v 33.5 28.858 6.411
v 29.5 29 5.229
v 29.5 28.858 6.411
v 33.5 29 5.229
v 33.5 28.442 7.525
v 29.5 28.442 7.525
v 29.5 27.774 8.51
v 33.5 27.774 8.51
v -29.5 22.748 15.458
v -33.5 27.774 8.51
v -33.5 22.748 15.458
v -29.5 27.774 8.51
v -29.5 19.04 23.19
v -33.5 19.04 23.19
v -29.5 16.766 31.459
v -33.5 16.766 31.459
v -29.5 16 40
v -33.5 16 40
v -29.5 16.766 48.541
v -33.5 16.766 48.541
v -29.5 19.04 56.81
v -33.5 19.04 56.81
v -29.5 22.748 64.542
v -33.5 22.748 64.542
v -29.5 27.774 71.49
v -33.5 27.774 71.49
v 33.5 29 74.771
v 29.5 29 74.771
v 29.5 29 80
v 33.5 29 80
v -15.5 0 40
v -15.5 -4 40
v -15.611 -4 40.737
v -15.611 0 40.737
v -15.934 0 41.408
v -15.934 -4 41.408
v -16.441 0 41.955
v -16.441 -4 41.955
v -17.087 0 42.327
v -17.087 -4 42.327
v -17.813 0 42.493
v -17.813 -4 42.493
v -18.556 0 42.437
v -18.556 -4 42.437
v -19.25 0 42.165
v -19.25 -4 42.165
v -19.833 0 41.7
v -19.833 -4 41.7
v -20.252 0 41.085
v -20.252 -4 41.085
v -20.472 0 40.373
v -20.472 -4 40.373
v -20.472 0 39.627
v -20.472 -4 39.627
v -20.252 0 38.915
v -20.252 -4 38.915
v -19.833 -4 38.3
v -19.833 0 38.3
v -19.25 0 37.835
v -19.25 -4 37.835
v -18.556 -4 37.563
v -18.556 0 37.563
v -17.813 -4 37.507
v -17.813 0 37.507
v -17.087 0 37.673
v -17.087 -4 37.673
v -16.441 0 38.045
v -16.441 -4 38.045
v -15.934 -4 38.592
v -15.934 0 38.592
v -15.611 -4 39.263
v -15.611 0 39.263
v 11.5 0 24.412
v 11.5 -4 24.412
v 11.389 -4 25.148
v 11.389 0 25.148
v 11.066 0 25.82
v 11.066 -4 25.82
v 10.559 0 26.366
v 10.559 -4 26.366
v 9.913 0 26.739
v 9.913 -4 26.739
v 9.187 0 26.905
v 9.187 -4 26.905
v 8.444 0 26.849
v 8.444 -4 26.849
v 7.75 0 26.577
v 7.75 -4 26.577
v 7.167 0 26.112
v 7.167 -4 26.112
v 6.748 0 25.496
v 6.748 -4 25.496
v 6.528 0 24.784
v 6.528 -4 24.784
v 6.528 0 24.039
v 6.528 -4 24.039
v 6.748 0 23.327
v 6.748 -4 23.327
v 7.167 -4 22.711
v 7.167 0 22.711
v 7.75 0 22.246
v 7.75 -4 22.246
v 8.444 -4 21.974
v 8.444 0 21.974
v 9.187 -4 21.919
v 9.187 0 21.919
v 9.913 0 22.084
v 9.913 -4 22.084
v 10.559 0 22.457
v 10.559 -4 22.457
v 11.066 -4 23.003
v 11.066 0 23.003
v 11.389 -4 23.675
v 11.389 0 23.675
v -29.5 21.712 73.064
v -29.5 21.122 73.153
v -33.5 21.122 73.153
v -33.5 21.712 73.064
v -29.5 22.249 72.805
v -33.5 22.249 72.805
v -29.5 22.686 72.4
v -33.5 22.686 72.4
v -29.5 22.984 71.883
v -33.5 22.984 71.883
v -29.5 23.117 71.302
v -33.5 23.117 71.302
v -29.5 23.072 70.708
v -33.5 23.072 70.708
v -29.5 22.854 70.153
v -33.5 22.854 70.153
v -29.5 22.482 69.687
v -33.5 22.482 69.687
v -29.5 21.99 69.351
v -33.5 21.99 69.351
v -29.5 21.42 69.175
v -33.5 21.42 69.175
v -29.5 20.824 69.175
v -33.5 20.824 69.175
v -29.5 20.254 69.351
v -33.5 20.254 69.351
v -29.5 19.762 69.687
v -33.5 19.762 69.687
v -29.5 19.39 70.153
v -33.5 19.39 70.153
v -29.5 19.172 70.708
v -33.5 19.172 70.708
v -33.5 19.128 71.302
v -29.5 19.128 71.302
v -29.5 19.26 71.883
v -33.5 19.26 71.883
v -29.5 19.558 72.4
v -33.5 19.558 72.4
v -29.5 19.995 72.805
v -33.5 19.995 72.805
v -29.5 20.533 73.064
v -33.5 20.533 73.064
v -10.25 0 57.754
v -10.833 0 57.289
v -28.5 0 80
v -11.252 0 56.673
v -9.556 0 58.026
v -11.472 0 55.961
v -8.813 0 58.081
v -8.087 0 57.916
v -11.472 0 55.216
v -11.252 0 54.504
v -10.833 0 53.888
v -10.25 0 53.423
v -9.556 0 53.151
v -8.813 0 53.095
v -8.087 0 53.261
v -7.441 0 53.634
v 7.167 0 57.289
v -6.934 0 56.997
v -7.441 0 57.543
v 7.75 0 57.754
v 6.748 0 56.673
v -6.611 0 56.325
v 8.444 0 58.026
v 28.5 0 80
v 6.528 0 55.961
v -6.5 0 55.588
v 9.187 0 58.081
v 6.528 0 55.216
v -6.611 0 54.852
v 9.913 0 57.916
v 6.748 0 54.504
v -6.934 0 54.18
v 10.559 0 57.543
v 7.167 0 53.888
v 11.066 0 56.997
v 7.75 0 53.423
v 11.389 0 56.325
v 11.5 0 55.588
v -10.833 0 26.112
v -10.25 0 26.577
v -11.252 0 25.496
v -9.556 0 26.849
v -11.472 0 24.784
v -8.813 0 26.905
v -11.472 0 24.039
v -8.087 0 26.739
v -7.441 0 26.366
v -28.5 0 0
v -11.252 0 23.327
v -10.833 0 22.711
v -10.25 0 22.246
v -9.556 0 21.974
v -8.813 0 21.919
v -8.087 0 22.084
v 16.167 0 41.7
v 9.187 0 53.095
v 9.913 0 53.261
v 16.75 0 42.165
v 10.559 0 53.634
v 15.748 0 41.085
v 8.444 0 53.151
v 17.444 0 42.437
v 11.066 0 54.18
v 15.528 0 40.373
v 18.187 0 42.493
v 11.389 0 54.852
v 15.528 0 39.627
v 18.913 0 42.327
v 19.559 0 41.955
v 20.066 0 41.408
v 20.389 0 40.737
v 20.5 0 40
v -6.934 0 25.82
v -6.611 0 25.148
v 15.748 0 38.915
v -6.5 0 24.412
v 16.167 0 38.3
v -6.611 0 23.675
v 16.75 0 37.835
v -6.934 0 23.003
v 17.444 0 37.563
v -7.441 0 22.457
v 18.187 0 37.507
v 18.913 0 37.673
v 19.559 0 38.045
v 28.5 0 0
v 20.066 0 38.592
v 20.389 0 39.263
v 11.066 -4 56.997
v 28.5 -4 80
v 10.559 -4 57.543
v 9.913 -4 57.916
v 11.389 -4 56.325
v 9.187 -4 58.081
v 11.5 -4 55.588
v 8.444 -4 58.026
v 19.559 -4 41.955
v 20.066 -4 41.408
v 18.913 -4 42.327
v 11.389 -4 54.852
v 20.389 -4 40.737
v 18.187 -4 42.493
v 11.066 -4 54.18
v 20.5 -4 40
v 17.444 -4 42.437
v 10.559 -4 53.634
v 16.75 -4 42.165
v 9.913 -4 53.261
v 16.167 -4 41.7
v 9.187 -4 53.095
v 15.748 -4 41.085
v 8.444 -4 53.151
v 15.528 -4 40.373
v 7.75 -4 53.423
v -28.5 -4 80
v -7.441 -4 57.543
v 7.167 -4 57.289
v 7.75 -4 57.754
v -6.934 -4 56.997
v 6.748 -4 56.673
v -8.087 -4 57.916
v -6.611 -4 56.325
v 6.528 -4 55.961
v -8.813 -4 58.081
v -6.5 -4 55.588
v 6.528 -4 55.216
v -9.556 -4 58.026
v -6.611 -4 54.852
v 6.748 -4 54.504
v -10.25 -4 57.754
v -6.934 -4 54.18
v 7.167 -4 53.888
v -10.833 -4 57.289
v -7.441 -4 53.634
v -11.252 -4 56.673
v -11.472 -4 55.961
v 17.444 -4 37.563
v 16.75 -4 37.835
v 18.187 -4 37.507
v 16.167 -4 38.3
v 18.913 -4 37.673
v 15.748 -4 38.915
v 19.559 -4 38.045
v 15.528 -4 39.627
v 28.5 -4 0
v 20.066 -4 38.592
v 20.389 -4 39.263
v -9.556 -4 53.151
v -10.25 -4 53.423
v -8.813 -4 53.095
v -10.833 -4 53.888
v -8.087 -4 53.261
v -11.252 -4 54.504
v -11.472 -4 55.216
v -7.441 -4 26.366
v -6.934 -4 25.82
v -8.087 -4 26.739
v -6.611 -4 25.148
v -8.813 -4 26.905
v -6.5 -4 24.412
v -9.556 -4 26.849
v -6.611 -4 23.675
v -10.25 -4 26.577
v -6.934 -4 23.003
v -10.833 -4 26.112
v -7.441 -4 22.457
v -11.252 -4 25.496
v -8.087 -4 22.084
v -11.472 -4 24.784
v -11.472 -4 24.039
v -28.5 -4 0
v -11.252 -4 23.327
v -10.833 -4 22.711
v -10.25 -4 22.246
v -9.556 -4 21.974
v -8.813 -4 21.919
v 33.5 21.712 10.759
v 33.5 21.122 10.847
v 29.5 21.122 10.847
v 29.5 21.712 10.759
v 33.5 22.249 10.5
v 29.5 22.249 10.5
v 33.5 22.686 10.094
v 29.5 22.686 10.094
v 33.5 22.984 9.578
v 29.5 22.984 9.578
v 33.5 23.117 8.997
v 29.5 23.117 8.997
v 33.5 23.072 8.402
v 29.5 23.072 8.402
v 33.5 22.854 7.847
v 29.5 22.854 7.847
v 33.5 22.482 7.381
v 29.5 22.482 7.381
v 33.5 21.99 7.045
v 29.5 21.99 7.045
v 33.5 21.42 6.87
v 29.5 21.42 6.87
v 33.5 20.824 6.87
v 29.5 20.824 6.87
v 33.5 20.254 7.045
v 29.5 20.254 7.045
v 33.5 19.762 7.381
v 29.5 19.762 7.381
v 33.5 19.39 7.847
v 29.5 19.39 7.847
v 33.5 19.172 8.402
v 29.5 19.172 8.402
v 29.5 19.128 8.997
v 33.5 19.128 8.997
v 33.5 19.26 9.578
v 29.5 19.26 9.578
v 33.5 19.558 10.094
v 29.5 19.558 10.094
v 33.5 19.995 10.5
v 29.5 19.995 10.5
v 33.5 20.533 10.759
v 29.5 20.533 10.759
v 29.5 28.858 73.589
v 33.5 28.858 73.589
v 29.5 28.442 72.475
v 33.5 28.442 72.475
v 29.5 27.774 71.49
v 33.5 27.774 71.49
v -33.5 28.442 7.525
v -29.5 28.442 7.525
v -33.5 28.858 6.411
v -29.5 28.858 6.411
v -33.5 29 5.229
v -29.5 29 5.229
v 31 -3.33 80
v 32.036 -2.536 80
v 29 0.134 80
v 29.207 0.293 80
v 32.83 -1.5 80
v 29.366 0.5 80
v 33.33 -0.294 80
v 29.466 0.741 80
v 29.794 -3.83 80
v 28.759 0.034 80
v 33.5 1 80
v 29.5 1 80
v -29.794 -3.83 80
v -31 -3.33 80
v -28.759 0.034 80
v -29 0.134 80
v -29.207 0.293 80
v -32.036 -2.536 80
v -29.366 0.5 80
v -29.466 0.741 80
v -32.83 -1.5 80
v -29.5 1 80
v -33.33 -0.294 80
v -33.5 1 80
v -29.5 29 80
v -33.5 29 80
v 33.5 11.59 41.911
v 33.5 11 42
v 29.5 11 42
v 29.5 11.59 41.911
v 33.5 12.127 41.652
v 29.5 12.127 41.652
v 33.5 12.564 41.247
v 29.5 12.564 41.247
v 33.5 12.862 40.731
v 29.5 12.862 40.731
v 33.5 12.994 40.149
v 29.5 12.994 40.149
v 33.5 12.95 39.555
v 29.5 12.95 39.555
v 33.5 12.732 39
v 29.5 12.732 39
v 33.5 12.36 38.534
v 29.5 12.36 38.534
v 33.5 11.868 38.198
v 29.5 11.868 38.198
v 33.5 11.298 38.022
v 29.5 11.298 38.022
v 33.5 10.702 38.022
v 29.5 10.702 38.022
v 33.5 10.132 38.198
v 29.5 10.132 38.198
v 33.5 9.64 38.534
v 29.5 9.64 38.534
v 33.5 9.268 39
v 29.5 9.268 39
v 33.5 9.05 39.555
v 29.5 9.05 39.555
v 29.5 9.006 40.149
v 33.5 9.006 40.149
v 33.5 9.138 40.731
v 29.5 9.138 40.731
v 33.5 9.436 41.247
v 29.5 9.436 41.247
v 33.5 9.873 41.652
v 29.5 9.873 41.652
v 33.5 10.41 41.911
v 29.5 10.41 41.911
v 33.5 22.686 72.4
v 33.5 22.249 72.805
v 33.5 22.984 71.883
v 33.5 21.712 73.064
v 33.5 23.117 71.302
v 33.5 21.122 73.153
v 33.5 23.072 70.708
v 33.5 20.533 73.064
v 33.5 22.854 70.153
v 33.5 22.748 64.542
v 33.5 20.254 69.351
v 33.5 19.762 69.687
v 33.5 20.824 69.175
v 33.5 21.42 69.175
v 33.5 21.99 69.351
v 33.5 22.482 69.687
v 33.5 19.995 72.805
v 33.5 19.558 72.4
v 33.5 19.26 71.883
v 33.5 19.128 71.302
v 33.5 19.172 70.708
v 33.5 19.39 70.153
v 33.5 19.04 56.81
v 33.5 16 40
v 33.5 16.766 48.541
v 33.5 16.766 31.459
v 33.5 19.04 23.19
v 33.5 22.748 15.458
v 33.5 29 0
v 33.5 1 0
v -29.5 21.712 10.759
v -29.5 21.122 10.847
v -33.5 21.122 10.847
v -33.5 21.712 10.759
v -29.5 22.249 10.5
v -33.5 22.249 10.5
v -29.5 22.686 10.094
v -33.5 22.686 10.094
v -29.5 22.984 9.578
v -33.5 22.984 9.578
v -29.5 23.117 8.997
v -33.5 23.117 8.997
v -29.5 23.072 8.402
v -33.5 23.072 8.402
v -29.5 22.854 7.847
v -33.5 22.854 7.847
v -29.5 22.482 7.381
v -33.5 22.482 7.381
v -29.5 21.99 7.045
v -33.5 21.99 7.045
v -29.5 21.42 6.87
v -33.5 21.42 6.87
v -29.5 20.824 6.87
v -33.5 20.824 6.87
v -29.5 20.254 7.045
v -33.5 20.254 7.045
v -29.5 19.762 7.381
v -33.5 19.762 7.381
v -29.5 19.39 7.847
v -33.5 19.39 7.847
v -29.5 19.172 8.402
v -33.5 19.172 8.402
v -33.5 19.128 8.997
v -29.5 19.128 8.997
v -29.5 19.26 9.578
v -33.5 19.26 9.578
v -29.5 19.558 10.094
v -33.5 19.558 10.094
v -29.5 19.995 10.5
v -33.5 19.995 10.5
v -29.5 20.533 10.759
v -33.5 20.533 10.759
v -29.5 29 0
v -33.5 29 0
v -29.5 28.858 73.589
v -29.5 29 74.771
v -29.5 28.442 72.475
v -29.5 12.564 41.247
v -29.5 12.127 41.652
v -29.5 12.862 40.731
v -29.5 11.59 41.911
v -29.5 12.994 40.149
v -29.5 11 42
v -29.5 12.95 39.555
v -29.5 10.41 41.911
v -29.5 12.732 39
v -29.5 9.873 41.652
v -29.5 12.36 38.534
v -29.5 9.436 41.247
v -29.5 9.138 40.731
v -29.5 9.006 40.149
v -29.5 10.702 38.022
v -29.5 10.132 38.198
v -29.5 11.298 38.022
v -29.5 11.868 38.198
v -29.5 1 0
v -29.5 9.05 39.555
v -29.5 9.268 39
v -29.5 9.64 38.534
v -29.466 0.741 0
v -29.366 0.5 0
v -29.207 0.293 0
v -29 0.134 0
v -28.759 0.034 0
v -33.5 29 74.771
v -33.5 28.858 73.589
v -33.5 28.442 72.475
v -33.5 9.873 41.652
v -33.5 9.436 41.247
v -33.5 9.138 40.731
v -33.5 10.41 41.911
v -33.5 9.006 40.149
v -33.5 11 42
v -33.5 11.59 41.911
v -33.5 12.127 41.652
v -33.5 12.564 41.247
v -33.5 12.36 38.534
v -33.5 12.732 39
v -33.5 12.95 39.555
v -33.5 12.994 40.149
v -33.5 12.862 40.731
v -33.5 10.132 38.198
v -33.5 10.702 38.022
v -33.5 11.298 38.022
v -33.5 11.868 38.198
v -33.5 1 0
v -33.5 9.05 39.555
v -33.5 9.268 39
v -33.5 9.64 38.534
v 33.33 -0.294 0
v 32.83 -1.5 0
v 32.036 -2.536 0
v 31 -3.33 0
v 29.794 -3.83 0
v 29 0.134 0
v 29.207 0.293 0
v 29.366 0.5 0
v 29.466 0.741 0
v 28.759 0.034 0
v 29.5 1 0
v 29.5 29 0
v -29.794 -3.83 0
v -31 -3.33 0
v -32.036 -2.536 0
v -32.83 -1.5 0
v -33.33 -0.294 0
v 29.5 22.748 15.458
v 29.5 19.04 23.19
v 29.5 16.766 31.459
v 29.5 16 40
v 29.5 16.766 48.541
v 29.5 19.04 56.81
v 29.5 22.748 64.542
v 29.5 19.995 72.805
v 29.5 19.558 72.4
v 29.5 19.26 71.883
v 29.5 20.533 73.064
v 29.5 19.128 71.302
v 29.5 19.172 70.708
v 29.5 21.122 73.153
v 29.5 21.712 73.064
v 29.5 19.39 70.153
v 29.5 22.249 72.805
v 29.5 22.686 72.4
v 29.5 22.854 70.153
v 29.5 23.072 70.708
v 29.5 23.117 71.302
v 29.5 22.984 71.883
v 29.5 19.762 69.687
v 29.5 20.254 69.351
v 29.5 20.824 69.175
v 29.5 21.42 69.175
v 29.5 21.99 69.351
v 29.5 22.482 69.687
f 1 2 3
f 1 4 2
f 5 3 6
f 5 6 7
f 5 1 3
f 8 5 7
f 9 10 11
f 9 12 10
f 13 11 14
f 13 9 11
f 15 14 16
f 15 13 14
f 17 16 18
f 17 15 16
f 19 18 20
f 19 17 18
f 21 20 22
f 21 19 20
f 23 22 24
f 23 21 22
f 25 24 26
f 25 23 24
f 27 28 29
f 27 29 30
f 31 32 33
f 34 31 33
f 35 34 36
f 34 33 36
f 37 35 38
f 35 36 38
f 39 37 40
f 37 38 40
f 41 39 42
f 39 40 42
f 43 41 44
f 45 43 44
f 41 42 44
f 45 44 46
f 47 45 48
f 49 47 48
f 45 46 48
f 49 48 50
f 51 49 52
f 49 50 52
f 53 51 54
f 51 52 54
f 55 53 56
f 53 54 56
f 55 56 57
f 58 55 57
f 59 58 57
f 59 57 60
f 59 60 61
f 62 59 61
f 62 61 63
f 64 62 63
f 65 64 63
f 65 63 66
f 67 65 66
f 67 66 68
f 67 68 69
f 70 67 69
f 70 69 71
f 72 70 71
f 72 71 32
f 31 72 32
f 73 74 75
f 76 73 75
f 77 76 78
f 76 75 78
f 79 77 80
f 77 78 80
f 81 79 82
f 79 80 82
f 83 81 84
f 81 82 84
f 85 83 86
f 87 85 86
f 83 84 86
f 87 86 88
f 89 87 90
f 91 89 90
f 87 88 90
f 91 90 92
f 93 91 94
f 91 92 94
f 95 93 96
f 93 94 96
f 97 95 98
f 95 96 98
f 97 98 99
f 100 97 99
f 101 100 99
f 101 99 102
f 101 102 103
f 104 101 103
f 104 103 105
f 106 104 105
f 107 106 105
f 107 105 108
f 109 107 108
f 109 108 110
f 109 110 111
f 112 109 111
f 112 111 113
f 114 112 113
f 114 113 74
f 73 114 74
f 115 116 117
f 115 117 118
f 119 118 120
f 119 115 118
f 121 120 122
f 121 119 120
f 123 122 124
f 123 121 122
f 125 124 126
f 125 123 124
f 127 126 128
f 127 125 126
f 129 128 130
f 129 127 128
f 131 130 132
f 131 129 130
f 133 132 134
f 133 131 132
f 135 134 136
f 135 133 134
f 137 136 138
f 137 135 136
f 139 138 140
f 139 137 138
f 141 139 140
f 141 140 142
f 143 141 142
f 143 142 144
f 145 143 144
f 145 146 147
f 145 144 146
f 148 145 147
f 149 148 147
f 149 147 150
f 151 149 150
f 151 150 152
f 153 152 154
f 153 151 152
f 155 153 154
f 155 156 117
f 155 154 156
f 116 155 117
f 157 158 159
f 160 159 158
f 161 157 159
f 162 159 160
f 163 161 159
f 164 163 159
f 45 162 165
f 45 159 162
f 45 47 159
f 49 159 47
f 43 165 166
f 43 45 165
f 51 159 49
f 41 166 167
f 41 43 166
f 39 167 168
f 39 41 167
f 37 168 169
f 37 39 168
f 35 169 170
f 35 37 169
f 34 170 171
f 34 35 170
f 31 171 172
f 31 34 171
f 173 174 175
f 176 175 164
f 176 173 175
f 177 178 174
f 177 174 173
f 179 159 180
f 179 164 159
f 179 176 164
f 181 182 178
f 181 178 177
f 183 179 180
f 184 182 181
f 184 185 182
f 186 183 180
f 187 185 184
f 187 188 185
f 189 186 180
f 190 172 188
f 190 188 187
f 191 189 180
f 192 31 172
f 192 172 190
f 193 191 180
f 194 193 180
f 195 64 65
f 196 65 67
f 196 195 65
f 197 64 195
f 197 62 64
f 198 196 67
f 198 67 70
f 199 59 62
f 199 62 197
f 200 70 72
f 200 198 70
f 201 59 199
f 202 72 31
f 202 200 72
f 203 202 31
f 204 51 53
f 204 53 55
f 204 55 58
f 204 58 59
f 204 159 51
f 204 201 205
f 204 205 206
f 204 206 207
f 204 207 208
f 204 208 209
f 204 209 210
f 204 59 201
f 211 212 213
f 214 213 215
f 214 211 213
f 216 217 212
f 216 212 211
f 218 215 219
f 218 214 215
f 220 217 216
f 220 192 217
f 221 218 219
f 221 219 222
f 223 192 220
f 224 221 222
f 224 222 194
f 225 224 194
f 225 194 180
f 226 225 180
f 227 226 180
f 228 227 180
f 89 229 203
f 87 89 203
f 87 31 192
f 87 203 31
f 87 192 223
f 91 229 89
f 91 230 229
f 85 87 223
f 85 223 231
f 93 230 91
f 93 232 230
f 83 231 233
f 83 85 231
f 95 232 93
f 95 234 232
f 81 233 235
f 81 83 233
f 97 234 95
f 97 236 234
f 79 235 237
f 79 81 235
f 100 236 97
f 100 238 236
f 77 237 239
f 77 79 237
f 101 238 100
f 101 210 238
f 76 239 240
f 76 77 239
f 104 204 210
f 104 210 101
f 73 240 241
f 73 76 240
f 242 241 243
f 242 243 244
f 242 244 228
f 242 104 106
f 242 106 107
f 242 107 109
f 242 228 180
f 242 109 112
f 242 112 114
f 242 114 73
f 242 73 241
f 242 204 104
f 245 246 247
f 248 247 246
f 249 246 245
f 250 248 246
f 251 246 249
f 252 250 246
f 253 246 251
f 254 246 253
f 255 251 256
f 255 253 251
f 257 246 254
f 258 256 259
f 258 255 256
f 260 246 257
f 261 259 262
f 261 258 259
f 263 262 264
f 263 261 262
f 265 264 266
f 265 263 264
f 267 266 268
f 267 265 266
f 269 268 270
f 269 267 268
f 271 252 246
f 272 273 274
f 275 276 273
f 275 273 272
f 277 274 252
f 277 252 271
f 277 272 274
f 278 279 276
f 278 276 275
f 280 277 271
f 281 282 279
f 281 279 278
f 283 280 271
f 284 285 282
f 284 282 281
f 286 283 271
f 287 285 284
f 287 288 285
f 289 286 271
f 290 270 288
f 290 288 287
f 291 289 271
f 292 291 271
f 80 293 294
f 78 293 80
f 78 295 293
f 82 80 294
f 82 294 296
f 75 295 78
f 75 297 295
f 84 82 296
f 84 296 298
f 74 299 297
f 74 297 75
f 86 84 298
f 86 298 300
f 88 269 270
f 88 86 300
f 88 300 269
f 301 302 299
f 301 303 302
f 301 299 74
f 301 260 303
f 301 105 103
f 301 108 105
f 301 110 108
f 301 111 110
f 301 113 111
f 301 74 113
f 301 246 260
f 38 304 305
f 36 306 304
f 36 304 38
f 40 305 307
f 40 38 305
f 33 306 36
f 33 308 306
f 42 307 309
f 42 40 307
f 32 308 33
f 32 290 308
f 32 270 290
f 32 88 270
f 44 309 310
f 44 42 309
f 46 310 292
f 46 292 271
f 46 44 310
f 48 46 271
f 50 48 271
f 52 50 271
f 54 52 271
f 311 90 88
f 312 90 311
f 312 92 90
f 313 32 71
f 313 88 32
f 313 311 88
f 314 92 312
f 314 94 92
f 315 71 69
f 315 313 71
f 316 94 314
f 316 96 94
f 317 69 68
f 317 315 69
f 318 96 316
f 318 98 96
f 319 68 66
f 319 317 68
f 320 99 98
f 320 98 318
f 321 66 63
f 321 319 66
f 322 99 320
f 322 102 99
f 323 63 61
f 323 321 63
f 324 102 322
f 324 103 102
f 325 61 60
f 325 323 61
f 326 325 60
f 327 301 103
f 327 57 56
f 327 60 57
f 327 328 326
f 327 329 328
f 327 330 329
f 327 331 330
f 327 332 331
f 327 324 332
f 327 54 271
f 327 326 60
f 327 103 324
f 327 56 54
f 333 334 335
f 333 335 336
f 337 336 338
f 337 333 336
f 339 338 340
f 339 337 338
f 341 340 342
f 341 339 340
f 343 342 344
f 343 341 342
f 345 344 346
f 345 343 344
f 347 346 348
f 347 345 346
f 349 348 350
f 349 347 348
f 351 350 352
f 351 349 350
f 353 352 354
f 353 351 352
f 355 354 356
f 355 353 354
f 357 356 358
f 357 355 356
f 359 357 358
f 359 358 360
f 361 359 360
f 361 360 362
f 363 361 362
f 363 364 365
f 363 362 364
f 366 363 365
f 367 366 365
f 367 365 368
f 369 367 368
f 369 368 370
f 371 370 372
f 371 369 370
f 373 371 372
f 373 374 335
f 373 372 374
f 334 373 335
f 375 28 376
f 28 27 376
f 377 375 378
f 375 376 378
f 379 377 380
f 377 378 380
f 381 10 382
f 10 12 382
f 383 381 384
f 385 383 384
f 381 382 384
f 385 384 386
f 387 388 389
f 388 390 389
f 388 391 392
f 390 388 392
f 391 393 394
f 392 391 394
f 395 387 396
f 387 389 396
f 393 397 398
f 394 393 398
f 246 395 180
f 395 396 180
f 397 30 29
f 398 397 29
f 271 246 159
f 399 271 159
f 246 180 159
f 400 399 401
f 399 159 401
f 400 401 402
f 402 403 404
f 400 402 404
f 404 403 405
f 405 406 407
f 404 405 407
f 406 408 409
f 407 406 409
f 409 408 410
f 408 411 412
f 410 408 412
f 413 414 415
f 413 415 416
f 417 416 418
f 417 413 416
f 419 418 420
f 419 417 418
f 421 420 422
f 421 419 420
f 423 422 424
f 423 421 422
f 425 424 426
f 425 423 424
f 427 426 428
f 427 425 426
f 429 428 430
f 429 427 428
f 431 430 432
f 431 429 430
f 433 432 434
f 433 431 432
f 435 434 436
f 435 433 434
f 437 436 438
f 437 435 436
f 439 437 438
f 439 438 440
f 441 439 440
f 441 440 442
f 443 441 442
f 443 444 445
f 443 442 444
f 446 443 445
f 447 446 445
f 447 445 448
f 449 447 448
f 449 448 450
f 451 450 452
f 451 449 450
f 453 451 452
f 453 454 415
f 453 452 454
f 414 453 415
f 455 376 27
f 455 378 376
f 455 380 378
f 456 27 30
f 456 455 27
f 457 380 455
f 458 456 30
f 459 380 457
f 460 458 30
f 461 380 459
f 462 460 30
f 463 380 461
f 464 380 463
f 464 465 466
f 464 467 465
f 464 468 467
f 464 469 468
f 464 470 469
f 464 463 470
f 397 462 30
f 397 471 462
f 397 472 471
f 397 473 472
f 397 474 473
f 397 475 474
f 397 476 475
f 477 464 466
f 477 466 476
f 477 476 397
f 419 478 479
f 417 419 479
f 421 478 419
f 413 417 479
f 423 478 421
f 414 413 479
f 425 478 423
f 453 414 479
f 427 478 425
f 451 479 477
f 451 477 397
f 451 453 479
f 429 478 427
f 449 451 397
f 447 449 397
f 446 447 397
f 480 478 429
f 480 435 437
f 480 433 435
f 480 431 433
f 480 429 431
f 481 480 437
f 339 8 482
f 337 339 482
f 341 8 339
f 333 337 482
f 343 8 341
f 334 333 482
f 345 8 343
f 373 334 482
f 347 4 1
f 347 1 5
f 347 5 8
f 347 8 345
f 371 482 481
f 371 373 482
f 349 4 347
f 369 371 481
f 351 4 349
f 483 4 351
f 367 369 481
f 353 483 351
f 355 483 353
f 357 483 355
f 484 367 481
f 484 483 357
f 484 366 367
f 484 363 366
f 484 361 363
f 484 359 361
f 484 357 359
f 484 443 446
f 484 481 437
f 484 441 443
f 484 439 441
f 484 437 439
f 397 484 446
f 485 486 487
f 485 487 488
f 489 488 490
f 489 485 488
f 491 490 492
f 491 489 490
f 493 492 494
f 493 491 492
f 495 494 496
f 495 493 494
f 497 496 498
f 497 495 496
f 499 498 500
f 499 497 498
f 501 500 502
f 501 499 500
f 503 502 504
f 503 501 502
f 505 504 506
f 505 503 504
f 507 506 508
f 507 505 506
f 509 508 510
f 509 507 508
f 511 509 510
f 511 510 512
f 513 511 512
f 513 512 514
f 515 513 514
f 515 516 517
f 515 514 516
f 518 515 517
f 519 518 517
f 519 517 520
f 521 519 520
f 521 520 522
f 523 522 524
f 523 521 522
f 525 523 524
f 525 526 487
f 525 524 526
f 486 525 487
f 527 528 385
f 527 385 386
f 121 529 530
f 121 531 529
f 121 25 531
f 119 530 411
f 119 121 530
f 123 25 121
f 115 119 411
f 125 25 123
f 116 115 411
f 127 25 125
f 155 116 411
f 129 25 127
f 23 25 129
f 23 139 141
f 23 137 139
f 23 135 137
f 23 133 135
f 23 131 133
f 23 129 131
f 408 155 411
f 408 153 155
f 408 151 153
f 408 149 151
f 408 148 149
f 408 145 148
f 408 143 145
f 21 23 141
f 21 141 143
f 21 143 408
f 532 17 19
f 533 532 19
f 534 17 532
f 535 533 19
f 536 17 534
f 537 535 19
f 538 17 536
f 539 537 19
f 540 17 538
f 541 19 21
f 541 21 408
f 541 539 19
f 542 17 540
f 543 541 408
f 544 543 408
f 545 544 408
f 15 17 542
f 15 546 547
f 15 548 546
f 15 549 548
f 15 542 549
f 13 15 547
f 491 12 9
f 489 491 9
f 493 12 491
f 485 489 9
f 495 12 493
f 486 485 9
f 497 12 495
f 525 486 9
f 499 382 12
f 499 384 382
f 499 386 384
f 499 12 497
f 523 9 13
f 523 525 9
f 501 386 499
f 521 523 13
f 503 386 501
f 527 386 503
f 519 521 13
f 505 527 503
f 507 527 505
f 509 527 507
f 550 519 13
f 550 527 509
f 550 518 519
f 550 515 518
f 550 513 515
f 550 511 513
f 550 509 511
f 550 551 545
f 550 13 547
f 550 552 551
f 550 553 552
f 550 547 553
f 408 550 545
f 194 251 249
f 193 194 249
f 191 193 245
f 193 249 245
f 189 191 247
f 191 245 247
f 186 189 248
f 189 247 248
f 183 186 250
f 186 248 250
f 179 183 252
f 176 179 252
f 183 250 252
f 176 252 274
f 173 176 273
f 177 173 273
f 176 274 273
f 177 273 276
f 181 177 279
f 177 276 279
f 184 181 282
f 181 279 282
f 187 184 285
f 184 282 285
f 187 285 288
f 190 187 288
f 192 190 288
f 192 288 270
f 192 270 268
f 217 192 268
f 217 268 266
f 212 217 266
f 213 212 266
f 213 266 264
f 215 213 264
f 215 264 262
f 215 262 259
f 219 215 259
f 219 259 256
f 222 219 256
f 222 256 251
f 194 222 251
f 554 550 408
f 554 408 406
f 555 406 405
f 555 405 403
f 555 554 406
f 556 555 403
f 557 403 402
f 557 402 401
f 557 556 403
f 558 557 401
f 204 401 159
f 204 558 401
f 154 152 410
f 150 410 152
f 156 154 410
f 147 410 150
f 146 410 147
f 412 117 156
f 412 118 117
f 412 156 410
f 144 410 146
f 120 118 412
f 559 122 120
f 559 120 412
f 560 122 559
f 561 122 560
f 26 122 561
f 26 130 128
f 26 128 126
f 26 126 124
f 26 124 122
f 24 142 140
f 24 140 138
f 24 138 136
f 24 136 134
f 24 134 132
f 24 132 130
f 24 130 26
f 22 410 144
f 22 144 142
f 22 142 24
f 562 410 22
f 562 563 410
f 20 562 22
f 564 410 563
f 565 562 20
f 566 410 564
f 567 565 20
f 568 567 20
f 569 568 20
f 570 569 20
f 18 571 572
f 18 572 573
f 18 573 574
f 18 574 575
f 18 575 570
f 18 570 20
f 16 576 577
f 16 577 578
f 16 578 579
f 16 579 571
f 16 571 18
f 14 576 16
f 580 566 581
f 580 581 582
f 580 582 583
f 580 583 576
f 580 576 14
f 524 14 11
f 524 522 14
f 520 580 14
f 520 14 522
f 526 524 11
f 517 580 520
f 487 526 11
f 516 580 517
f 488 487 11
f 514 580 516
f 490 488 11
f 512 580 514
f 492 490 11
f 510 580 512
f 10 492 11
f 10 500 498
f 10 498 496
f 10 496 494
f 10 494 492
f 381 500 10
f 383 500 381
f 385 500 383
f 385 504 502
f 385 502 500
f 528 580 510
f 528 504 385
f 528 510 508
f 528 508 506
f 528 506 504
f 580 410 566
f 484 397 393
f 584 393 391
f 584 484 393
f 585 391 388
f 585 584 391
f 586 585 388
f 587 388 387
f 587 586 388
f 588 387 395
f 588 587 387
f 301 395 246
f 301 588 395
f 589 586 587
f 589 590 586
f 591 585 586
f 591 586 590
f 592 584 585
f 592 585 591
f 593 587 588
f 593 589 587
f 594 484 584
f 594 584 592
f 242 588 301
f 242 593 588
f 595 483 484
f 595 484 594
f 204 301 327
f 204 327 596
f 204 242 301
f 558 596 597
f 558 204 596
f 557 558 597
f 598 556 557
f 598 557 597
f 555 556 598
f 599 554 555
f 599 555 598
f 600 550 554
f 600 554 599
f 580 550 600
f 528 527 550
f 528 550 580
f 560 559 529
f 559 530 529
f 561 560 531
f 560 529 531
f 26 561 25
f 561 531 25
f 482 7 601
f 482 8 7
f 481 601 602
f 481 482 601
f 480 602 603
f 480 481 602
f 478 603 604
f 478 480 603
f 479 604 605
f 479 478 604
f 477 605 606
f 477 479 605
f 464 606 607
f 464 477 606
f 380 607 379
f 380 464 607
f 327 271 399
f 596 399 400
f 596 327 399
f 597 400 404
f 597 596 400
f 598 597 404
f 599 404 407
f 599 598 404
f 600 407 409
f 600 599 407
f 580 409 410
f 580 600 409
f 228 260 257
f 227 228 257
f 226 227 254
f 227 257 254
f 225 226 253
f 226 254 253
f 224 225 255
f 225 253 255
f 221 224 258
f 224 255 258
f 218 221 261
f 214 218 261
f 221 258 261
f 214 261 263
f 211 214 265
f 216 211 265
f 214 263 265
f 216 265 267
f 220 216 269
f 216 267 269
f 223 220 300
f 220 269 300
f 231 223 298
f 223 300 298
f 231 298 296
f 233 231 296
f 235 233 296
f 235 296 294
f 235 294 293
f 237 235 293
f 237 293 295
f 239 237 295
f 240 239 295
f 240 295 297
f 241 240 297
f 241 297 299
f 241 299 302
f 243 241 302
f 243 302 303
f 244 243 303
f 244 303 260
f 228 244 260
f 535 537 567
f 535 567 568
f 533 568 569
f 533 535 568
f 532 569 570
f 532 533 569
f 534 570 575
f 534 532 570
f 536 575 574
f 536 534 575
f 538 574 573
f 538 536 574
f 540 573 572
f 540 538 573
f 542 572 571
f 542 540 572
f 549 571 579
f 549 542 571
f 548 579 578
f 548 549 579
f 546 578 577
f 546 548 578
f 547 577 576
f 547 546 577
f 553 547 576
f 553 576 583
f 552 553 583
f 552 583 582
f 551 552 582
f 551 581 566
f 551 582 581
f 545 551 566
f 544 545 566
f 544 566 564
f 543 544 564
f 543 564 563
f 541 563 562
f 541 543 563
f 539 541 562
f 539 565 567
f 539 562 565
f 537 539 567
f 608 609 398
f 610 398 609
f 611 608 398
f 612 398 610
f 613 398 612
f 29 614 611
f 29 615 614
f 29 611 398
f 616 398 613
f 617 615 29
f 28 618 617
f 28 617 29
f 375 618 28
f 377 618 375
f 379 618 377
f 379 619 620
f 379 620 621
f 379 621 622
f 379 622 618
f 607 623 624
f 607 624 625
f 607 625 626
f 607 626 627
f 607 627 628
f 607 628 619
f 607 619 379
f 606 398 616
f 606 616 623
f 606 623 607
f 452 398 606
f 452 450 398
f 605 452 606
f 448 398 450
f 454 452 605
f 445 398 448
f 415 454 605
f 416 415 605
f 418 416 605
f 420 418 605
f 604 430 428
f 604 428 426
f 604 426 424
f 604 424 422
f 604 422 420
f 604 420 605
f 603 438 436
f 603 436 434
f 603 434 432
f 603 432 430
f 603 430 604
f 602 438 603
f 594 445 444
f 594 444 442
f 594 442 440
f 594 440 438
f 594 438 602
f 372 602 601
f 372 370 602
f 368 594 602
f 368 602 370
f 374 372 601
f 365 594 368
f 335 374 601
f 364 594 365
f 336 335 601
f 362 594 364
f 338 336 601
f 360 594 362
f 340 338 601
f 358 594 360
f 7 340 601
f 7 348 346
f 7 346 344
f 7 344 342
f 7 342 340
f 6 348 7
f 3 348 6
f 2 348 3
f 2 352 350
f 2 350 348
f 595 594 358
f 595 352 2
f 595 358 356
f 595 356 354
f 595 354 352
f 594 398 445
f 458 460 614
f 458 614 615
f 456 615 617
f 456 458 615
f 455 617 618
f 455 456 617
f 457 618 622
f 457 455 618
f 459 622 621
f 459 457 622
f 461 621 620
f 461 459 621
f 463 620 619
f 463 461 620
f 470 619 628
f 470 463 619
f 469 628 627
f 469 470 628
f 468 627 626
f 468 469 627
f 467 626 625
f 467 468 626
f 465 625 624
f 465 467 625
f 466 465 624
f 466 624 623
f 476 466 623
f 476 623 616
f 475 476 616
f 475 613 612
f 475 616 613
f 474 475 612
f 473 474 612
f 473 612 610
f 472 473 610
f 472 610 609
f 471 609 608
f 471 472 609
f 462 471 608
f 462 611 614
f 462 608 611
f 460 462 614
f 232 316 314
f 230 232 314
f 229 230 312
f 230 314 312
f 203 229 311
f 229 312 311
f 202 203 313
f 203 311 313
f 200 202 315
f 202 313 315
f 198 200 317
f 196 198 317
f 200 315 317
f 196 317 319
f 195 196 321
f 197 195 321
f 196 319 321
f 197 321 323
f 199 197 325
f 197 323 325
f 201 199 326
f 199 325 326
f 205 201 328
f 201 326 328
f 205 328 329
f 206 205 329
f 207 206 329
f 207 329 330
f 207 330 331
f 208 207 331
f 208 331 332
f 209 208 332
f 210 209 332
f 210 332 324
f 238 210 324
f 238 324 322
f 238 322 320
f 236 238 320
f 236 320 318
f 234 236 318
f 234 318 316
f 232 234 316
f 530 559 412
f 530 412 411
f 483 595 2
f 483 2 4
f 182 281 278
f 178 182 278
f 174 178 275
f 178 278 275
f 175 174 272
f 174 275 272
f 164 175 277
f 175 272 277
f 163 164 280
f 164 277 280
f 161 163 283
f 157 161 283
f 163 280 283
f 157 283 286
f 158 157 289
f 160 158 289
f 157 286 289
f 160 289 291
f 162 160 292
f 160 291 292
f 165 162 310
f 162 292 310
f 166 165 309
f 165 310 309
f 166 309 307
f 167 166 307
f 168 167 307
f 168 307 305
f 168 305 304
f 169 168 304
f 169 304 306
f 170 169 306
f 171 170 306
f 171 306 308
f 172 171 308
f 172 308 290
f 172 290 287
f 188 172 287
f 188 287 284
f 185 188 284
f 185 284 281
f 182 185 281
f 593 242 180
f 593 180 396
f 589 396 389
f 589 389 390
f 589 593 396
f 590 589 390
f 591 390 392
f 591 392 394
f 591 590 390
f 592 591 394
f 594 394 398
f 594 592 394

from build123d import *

# Parameters (mm, degrees)
SM_BASE_FLANGE_1_DEPTH   = 80
CUT_EXTRUDE_3_DEPTH      = 109.305124532
CUT_EXTRUDE_3_DEPTH_BACK = 109.305124532
SKETCH_6_R               = 48
SKETCH_6_R_2             = 2
FILLET_1_R               = 5
SKETCH_9_R               = 2.5
CUT_EXTRUDE_4_DEPTH      = 93.796821066


# Sheet-metal steps are written as plain solids
with BuildPart() as part:
    # Sketch 1 → Базовая кромка1 (new body)
    with BuildSketch(Plane.XY):
        with BuildLine():
            Line((-29.5, 29), (-29.5, 1))
            ThreePointArc((-29.5, 1), (-29.207106781, 0.292893219), (-28.5, 0))
            Line((-28.5, 0), (28.5, 0))
            ThreePointArc((28.5, 0), (29.207106781, 0.292893219), (29.5, 1))
            Line((29.5, 1), (29.5, 29))
            Line((29.5, 29), (33.5, 29))
            Line((33.5, 29), (33.5, 1))
            ThreePointArc((33.5, 1), (32.035533906, -2.535533906), (28.5, -4))
            Line((28.5, -4), (-28.5, -4))
            ThreePointArc((-28.5, -4), (-32.035533906, -2.535533906), (-33.5, 1))
            Line((-33.5, 1), (-33.5, 29))
            Line((-33.5, 29), (-29.5, 29))
        make_face()
    extrude(amount=SM_BASE_FLANGE_1_DEPTH)

    # Эскиз6 → Вырез-Вытянуть3 (cut, two sides: drawn at the far end of the back side and taken through both)
    with BuildSketch(Plane.ZY.offset(33.5).offset(-CUT_EXTRUDE_3_DEPTH_BACK)):
        with Locations((40, 64)):
            Circle(SKETCH_6_R)
        with Locations((40, 11)):
            Circle(SKETCH_6_R_2)
        with Locations((8.847381628, 21.122099298)):
            Circle(SKETCH_6_R_2)
        with Locations((71.152618372, 21.122099298)):
            Circle(SKETCH_6_R_2)
    extrude(amount=CUT_EXTRUDE_3_DEPTH + CUT_EXTRUDE_3_DEPTH_BACK, mode=Mode.SUBTRACT)

    # Скругление1
    fillet_1_edges = [part.edges().sort_by_distance(p)[0] for p in [
        (31.5, 29, 7.151864589),
        (31.5, 29, 72.848135411),
        (-31.5, 29, 7.151864589),
        (-31.5, 29, 72.848135411),
    ]]
    fillet(fillet_1_edges, radius=FILLET_1_R)

    # Эскиз9 → Вырез-Вытянуть4 (cut, through all)
    with BuildSketch(Plane.XZ.offset(4)):
        with Locations((18, 40)):
            Circle(SKETCH_9_R)
        with Locations((9, 24.411542732)):
            Circle(SKETCH_9_R)
        with Locations((-9, 24.411542732)):
            Circle(SKETCH_9_R)
        with Locations((-18, 40)):
            Circle(SKETCH_9_R)
        with Locations((-9, 55.588457268)):
            Circle(SKETCH_9_R)
        with Locations((9, 55.588457268)):
            Circle(SKETCH_9_R)
    extrude(amount=-CUT_EXTRUDE_4_DEPTH, mode=Mode.SUBTRACT)


solid = part.part
